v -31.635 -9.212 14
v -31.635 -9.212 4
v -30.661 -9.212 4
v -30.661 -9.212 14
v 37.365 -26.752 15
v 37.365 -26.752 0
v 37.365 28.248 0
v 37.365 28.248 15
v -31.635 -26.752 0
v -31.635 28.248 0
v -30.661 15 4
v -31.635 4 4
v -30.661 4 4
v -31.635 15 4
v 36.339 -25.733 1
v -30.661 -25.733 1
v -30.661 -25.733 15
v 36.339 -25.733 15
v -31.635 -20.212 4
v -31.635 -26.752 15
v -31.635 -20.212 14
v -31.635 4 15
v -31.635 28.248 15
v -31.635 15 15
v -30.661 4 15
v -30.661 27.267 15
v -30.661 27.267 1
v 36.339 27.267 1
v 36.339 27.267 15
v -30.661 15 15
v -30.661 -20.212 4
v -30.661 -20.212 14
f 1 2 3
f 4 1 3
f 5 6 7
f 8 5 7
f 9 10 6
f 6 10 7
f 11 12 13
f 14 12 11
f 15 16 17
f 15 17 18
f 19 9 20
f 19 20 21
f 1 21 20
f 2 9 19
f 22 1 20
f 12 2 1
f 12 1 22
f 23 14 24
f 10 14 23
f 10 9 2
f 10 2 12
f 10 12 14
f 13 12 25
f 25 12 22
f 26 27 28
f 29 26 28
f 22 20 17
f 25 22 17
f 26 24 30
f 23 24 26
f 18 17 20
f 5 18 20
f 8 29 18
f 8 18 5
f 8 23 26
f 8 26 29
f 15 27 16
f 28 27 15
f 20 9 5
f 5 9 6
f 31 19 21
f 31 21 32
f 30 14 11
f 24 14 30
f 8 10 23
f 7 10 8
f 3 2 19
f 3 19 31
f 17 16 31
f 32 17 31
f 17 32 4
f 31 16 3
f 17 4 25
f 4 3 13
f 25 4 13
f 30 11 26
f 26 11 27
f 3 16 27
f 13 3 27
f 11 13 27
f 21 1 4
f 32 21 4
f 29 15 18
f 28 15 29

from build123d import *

# Parameters (mm, degrees)
SKETCH001_W  = 67
SKETCH001_H  = 53
PAD001_DEPTH = 15
SKETCH002_W  = 11
SKETCH002_H  = 12
PAD002_DEPTH = 10
SKETCH003_W  = 9
SKETCH003_H  = 11
PAD003_DEPTH = 10
SKETCH_W     = 69
SKETCH_H     = 55
PAD_DEPTH    = 15


with BuildPart() as body001:
    # Sketch001 → Pad001 (new body)
    with BuildSketch(Plane.XY):
        with Locations((-27.160627, -58.233018)):
            Rectangle(SKETCH001_W, SKETCH001_H)
    extrude(amount=PAD001_DEPTH)


with BuildPart() as body001_1:
    # Body001 placement: moved
    add(body001.part.moved(Location((30, 59, 1))))


with BuildPart() as body002:
    # Sketch002 → Pad002 (new body)
    with BuildSketch(Plane.YZ):
        with Locations((5.5, 6)):
            Rectangle(SKETCH002_W, SKETCH002_H)
    extrude(amount=PAD002_DEPTH)


with BuildPart() as body002_1:
    # Body002 placement: moved
    add(body002.part.moved(Location((-32, 4, 4))))


with BuildPart() as body003:
    # Sketch003 → Pad003 (new body)
    with BuildSketch(Plane.XY):
        with Locations((-41.905017, -12.711954)):
            Rectangle(SKETCH003_W, SKETCH003_H)
    extrude(amount=PAD003_DEPTH)


with BuildPart() as body003_1:
    # Body003 placement: moved
    add(body003.part.moved(Location((9, -2, 4))))


with BuildPart() as body:
    # Sketch → Pad (new body)
    with BuildSketch(Plane.XY):
        with Locations((2.865111, 0.748495)):
            Rectangle(SKETCH_W, SKETCH_H)
    extrude(amount=PAD_DEPTH)

    # Boolean: cut Body001
    add(body001_1.part, mode=Mode.SUBTRACT)

    # Boolean001: cut Body002
    add(body002_1.part, mode=Mode.SUBTRACT)

    # Boolean002: cut Body003
    add(body003_1.part, mode=Mode.SUBTRACT)


solid = body.part
